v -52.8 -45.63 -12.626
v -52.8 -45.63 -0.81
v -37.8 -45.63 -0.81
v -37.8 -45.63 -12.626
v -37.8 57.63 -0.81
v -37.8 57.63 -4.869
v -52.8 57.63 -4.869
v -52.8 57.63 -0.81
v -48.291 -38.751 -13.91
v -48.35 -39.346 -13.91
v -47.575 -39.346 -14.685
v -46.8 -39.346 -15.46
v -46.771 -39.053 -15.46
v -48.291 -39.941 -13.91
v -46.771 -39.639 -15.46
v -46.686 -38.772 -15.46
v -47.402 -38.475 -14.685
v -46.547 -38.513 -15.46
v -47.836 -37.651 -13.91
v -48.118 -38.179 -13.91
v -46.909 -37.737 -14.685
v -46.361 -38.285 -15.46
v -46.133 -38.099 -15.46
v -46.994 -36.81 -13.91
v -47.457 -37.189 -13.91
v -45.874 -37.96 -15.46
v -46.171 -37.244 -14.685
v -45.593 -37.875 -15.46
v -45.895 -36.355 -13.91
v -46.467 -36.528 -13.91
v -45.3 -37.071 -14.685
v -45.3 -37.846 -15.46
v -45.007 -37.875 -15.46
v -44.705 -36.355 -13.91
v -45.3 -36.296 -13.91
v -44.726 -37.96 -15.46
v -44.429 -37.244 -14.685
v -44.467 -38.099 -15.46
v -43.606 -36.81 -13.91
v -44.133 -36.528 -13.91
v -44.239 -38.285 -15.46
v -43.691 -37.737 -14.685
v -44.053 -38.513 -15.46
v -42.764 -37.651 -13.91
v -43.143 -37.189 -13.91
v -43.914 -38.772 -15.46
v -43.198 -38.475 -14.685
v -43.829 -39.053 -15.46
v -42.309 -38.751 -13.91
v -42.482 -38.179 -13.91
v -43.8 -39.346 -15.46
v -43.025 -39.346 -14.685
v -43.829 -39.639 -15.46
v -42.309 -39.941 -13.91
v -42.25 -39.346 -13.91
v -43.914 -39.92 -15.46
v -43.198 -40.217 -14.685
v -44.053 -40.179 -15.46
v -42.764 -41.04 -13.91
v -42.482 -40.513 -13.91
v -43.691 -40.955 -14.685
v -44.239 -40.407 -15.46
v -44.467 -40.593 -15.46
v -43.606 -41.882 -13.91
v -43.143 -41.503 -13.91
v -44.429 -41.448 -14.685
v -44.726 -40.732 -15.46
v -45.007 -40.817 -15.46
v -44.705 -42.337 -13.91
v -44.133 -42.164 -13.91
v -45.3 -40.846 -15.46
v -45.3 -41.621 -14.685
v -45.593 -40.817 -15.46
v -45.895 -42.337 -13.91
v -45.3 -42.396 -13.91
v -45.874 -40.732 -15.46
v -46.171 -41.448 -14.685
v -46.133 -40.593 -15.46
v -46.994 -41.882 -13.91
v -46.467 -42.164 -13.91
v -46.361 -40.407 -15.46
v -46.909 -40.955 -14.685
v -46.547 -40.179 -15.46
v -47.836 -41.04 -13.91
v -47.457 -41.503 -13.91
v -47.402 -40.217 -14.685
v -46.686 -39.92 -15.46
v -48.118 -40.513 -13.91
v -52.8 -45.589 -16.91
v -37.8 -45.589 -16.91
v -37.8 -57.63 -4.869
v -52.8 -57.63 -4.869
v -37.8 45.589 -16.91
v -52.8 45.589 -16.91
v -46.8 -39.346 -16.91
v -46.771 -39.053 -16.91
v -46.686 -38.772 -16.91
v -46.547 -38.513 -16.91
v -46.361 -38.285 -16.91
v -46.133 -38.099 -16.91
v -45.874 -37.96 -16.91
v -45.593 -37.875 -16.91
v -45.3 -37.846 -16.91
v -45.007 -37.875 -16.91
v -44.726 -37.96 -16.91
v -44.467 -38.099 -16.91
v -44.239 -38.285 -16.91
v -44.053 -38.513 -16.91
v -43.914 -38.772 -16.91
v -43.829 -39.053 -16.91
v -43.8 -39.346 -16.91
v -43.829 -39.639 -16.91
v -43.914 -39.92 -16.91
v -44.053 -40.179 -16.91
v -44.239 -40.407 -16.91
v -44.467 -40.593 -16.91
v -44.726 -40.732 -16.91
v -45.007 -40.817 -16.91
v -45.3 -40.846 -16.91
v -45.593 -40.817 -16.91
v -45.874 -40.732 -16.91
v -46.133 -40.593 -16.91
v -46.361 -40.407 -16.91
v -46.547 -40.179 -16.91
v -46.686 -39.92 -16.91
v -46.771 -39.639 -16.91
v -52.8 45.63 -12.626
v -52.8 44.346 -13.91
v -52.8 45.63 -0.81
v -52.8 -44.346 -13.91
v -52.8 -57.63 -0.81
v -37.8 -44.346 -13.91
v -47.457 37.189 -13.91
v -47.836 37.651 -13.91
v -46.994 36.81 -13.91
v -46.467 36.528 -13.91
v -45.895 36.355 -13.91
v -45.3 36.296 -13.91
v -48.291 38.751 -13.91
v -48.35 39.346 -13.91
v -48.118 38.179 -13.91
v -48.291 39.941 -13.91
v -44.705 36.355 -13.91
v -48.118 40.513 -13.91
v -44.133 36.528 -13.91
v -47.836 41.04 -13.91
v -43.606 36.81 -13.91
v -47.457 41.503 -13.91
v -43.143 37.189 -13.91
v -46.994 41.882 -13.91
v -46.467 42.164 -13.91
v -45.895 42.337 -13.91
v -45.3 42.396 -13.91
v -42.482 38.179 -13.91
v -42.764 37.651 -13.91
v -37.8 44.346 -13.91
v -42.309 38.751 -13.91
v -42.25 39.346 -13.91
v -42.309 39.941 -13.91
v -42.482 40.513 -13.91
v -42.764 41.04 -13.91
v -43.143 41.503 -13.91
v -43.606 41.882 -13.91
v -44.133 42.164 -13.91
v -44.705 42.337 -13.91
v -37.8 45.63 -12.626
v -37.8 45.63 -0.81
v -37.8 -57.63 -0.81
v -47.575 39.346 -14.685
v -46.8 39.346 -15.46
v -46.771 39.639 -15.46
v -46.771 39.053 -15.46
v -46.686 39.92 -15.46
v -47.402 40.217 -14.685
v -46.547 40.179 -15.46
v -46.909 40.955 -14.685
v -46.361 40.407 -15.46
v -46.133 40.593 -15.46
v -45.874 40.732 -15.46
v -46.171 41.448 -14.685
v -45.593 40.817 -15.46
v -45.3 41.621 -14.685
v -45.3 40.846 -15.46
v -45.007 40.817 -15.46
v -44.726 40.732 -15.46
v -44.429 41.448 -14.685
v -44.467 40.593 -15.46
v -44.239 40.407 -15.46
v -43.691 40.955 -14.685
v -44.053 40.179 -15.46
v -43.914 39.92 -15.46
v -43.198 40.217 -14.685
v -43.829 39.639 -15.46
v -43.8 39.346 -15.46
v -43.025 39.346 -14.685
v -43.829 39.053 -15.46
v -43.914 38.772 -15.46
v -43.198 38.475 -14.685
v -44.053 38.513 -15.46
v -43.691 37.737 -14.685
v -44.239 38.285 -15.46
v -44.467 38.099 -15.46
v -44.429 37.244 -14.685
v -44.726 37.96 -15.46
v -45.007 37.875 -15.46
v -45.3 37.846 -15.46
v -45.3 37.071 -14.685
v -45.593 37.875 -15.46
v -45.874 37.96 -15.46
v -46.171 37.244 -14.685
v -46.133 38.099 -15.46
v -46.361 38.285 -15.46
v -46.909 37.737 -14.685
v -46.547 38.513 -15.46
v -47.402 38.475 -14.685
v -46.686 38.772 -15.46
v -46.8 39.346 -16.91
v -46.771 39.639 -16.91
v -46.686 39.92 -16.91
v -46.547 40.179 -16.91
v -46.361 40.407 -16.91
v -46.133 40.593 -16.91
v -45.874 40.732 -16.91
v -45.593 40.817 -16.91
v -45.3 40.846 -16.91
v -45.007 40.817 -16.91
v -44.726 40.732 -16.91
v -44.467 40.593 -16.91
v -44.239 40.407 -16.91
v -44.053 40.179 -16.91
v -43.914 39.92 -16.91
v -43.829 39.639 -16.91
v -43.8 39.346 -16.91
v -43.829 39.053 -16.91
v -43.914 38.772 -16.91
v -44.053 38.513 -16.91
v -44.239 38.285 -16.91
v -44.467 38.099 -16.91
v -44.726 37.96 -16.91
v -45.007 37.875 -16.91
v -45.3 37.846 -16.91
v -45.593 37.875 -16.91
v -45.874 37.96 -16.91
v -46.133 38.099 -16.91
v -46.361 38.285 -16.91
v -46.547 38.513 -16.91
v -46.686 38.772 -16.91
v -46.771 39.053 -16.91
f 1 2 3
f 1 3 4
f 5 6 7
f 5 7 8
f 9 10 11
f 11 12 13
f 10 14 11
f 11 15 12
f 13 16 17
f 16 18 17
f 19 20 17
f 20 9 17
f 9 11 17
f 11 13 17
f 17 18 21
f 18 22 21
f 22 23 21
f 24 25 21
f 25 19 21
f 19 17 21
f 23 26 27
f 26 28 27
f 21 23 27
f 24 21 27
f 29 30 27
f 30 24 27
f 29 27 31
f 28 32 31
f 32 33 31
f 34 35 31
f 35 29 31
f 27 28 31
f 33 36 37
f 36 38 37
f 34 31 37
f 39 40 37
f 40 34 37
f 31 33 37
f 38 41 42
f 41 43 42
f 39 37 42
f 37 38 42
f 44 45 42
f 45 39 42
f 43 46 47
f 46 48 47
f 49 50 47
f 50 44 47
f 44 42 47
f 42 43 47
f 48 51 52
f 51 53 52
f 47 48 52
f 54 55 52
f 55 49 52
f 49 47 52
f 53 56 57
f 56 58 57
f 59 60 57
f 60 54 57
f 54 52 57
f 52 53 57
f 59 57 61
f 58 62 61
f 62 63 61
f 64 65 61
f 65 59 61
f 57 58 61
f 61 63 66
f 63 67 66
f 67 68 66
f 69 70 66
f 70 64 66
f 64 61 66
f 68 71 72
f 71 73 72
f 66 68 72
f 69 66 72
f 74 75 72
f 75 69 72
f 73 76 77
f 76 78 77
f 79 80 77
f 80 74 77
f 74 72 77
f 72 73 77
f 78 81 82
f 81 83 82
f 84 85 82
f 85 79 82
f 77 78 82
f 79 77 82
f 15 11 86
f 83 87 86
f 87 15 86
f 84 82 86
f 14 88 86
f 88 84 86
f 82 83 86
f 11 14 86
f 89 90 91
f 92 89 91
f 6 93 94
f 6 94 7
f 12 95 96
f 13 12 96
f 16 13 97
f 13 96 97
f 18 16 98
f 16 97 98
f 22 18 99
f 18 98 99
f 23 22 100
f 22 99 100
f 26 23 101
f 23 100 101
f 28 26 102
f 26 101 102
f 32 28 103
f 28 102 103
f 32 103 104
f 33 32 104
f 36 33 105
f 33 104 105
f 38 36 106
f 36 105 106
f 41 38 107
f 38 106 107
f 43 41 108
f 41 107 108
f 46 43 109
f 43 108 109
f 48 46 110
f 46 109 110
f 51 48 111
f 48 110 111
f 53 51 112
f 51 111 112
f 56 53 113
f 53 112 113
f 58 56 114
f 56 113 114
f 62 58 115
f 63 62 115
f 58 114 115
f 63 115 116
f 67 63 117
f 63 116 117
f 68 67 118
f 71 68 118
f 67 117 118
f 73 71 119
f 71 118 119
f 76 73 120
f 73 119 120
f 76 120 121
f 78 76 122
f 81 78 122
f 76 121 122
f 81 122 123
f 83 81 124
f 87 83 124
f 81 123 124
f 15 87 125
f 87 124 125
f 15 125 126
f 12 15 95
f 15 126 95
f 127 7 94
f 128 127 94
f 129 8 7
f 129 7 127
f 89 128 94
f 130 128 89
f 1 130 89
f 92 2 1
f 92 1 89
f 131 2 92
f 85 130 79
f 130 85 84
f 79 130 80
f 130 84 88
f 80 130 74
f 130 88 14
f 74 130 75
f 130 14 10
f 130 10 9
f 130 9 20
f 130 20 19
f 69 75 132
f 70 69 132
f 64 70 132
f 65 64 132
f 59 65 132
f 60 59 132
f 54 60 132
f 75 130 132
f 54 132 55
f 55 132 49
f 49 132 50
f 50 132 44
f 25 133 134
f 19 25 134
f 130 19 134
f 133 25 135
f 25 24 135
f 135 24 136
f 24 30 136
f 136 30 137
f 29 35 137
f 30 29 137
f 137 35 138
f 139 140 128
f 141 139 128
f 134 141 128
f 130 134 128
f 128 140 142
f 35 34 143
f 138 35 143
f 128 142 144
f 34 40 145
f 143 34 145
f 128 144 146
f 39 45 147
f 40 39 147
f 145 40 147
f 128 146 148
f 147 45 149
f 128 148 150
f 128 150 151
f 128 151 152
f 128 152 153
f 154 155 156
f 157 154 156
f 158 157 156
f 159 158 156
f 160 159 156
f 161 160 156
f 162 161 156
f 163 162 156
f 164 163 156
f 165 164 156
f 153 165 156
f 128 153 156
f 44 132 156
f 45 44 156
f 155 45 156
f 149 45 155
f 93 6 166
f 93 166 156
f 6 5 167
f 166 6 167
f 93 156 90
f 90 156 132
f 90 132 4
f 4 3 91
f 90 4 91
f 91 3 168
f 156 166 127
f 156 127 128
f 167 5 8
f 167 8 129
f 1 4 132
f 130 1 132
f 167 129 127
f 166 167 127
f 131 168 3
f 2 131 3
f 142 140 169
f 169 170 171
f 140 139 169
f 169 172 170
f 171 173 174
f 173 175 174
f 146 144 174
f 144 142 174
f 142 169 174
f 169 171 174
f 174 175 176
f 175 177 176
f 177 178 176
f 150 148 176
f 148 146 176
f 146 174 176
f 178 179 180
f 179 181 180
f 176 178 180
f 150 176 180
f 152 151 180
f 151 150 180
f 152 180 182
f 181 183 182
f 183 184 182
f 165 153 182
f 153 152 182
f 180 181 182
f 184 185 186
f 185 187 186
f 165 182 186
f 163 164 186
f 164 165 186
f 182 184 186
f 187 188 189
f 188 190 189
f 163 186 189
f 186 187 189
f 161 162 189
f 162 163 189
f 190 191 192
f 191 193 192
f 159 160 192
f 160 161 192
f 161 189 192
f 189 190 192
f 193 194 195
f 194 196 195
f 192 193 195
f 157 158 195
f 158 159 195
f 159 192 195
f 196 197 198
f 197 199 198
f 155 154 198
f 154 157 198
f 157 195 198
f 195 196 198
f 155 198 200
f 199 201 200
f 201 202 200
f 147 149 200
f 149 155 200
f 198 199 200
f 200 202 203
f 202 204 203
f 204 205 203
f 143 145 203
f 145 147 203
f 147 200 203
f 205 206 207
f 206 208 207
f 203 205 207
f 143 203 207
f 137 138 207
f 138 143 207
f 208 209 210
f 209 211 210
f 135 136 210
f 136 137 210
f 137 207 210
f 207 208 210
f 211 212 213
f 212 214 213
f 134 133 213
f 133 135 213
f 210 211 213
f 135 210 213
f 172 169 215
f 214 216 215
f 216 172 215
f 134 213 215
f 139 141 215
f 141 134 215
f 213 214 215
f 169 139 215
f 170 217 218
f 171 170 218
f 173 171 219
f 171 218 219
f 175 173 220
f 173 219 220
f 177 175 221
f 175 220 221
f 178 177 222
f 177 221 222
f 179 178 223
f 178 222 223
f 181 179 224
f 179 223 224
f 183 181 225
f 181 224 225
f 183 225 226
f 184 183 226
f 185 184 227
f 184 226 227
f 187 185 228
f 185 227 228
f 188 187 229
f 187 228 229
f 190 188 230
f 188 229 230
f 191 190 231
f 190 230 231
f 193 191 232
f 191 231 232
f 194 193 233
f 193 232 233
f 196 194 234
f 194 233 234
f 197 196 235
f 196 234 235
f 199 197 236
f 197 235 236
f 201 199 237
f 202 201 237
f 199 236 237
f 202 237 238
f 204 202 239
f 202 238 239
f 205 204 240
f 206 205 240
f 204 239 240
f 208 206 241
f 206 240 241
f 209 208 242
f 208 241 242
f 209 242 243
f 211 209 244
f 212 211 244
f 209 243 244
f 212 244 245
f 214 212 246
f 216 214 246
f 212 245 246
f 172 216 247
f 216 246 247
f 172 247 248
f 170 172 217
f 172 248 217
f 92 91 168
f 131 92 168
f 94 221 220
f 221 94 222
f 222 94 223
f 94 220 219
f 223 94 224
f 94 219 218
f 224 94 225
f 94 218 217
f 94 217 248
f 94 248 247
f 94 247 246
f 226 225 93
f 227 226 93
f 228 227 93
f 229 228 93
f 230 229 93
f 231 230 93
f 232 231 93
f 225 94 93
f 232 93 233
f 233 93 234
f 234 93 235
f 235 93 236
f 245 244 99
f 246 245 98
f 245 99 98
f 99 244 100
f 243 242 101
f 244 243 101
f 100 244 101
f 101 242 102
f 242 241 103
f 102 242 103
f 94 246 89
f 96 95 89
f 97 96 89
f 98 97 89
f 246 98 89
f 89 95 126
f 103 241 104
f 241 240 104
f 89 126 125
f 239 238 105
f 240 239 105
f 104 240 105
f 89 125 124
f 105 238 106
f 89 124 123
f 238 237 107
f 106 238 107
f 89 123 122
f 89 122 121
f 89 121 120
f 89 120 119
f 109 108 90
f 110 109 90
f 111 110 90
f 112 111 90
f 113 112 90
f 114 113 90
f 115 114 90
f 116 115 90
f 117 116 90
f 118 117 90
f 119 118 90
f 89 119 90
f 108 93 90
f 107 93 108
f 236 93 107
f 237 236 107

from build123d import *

# Parameters (mm, degrees)
PAD005_DEPTH        = 15
HOLE001_D           = 3
HOLE001_DEPTH       = 25
HOLE001_CSINK_D     = 6.1
HOLE001_CSINK_ANGLE = 90
HOLE_D              = 3
HOLE_DEPTH          = 25
HOLE_CSINK_D        = 6.1
HOLE_CSINK_ANGLE    = 90


with BuildPart() as part:
    # Sketch005 (on Face53 of Binder002) → Pad005 (new body)
    with BuildSketch(Plane(origin=(87.2, 0, 0), x_dir=(0, -1, 0), z_dir=(-1, 0, 0))):
        Polygon((-57.63, -4.868579), (-57.63, -0.81), (-45.63, -0.81), (-45.63, -12.625938), (-44.345938, -13.91), (0, -13.91), (0, -16.91), (-45.588579, -16.91), align=None)
    pad005 = extrude(amount=PAD005_DEPTH)

    # Mirrored: Pad005 across Sketch005 V_Axis
    add(pad005.mirror(Plane(origin=(87.2, 0, 0), x_dir=(-1, 0, 0), z_dir=(0, -1, 0))))

    # Hole001
    with Locations(Plane.XY.offset(-13.91)):
        with Locations((79.7, 39.345938), (79.7, -39.345938)):
            CounterSinkHole(HOLE001_D / 2, HOLE001_CSINK_D / 2, depth=HOLE001_DEPTH, counter_sink_angle=HOLE001_CSINK_ANGLE)

    # Hole
    with Locations(Plane.XY.offset(-13.91)):
        with Locations((79.7, 39.345938), (79.7, -39.345938)):
            CounterSinkHole(HOLE_D / 2, HOLE_CSINK_D / 2, depth=HOLE_DEPTH, counter_sink_angle=HOLE_CSINK_ANGLE)


with BuildPart() as part_1:
    # Body003 placement: moved
    add(part.part.moved(Location((-125, 0, 0))))


solid = part_1.part
